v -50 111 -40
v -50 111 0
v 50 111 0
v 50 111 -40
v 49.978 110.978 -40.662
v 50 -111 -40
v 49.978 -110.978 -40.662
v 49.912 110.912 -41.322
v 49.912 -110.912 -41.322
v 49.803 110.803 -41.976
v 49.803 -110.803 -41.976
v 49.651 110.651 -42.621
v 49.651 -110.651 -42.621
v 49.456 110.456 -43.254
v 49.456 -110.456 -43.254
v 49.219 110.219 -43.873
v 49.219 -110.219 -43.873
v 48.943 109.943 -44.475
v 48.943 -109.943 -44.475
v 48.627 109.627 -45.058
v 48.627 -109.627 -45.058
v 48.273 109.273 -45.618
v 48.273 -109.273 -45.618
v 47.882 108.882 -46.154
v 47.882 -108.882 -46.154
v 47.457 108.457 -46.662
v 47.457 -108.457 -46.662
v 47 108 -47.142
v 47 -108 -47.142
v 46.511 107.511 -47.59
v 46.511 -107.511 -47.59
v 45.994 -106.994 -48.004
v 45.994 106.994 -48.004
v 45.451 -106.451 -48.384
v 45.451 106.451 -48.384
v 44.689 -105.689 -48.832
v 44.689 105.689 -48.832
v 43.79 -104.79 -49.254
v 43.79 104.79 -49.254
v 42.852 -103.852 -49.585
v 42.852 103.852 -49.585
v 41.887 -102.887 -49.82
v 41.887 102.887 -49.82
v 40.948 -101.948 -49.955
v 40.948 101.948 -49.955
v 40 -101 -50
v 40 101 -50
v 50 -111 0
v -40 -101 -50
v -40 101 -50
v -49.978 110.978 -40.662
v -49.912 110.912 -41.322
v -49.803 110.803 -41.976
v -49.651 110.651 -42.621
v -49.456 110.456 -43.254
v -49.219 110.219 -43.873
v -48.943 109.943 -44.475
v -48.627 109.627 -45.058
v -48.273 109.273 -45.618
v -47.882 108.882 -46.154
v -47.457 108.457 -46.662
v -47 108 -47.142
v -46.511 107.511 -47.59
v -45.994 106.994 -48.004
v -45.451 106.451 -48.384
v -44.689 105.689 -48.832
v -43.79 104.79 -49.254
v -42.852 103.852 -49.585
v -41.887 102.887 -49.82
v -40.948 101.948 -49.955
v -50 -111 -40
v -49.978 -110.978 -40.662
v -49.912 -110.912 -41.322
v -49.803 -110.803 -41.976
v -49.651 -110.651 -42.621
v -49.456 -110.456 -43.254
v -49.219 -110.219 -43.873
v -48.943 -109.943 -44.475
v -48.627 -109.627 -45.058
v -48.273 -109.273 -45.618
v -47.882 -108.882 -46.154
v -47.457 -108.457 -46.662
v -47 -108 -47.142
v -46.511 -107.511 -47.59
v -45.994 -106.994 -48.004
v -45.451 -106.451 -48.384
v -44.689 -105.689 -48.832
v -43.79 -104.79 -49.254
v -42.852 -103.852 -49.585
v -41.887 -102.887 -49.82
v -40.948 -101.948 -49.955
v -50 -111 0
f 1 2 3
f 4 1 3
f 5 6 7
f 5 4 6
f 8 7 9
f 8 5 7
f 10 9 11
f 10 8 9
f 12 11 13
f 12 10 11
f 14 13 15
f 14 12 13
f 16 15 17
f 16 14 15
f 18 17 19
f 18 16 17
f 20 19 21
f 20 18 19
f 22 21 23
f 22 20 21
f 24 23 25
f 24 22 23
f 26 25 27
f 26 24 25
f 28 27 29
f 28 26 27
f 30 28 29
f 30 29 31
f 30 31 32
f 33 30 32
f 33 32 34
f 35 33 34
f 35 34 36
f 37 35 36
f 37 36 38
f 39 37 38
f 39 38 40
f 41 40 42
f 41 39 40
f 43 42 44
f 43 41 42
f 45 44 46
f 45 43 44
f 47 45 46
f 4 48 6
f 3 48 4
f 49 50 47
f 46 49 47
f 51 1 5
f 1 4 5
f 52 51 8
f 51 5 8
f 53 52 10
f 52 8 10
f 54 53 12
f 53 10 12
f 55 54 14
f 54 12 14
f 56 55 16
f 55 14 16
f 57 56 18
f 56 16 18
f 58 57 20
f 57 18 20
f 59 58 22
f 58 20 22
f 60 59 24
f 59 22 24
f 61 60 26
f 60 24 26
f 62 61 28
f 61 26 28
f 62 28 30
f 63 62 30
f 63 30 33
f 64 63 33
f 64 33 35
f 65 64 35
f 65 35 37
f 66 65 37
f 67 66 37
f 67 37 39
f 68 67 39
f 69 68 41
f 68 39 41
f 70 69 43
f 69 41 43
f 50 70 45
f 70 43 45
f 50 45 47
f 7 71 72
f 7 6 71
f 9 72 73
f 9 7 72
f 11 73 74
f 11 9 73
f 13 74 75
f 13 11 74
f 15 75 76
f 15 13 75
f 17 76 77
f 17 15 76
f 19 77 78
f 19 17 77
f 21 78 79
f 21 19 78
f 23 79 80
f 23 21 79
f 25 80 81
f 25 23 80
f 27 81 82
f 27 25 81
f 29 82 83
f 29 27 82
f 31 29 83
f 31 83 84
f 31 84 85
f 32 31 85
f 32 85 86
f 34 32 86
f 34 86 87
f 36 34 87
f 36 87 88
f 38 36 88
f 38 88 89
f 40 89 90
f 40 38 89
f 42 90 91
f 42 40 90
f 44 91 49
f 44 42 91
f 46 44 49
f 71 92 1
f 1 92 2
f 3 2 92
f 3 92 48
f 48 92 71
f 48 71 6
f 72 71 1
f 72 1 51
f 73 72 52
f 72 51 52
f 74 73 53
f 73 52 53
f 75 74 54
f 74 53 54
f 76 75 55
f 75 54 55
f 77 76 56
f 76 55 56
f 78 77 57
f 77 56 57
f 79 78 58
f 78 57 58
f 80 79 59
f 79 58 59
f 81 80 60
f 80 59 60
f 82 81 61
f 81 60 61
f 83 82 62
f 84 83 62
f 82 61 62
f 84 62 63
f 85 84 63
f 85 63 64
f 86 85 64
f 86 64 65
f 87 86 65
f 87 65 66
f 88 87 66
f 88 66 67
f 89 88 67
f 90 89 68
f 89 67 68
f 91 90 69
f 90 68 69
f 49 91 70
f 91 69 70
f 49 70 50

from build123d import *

# Parameters (mm, degrees)
PROFILE_SKETCH_W      = 100
PROFILE_SKETCH_H      = 222
PROFILE_EXTRUDE_DEPTH = 50
FILLET1_R             = 10


with BuildPart() as part:
    # Profile Sketch → Profile Extrude (new body)
    with BuildSketch(Plane.XY):
        Rectangle(PROFILE_SKETCH_W, PROFILE_SKETCH_H)
    extrude(amount=-PROFILE_EXTRUDE_DEPTH)

    # Fillet1
    fillet1_edges = [part.edges().sort_by_distance(p)[0] for p in [
        (-50, 0, -50),
        (0, -111, -50),
        (50, 0, -50),
        (0, 111, -50),
    ]]
    fillet(fillet1_edges, radius=FILLET1_R)


solid = part.part
